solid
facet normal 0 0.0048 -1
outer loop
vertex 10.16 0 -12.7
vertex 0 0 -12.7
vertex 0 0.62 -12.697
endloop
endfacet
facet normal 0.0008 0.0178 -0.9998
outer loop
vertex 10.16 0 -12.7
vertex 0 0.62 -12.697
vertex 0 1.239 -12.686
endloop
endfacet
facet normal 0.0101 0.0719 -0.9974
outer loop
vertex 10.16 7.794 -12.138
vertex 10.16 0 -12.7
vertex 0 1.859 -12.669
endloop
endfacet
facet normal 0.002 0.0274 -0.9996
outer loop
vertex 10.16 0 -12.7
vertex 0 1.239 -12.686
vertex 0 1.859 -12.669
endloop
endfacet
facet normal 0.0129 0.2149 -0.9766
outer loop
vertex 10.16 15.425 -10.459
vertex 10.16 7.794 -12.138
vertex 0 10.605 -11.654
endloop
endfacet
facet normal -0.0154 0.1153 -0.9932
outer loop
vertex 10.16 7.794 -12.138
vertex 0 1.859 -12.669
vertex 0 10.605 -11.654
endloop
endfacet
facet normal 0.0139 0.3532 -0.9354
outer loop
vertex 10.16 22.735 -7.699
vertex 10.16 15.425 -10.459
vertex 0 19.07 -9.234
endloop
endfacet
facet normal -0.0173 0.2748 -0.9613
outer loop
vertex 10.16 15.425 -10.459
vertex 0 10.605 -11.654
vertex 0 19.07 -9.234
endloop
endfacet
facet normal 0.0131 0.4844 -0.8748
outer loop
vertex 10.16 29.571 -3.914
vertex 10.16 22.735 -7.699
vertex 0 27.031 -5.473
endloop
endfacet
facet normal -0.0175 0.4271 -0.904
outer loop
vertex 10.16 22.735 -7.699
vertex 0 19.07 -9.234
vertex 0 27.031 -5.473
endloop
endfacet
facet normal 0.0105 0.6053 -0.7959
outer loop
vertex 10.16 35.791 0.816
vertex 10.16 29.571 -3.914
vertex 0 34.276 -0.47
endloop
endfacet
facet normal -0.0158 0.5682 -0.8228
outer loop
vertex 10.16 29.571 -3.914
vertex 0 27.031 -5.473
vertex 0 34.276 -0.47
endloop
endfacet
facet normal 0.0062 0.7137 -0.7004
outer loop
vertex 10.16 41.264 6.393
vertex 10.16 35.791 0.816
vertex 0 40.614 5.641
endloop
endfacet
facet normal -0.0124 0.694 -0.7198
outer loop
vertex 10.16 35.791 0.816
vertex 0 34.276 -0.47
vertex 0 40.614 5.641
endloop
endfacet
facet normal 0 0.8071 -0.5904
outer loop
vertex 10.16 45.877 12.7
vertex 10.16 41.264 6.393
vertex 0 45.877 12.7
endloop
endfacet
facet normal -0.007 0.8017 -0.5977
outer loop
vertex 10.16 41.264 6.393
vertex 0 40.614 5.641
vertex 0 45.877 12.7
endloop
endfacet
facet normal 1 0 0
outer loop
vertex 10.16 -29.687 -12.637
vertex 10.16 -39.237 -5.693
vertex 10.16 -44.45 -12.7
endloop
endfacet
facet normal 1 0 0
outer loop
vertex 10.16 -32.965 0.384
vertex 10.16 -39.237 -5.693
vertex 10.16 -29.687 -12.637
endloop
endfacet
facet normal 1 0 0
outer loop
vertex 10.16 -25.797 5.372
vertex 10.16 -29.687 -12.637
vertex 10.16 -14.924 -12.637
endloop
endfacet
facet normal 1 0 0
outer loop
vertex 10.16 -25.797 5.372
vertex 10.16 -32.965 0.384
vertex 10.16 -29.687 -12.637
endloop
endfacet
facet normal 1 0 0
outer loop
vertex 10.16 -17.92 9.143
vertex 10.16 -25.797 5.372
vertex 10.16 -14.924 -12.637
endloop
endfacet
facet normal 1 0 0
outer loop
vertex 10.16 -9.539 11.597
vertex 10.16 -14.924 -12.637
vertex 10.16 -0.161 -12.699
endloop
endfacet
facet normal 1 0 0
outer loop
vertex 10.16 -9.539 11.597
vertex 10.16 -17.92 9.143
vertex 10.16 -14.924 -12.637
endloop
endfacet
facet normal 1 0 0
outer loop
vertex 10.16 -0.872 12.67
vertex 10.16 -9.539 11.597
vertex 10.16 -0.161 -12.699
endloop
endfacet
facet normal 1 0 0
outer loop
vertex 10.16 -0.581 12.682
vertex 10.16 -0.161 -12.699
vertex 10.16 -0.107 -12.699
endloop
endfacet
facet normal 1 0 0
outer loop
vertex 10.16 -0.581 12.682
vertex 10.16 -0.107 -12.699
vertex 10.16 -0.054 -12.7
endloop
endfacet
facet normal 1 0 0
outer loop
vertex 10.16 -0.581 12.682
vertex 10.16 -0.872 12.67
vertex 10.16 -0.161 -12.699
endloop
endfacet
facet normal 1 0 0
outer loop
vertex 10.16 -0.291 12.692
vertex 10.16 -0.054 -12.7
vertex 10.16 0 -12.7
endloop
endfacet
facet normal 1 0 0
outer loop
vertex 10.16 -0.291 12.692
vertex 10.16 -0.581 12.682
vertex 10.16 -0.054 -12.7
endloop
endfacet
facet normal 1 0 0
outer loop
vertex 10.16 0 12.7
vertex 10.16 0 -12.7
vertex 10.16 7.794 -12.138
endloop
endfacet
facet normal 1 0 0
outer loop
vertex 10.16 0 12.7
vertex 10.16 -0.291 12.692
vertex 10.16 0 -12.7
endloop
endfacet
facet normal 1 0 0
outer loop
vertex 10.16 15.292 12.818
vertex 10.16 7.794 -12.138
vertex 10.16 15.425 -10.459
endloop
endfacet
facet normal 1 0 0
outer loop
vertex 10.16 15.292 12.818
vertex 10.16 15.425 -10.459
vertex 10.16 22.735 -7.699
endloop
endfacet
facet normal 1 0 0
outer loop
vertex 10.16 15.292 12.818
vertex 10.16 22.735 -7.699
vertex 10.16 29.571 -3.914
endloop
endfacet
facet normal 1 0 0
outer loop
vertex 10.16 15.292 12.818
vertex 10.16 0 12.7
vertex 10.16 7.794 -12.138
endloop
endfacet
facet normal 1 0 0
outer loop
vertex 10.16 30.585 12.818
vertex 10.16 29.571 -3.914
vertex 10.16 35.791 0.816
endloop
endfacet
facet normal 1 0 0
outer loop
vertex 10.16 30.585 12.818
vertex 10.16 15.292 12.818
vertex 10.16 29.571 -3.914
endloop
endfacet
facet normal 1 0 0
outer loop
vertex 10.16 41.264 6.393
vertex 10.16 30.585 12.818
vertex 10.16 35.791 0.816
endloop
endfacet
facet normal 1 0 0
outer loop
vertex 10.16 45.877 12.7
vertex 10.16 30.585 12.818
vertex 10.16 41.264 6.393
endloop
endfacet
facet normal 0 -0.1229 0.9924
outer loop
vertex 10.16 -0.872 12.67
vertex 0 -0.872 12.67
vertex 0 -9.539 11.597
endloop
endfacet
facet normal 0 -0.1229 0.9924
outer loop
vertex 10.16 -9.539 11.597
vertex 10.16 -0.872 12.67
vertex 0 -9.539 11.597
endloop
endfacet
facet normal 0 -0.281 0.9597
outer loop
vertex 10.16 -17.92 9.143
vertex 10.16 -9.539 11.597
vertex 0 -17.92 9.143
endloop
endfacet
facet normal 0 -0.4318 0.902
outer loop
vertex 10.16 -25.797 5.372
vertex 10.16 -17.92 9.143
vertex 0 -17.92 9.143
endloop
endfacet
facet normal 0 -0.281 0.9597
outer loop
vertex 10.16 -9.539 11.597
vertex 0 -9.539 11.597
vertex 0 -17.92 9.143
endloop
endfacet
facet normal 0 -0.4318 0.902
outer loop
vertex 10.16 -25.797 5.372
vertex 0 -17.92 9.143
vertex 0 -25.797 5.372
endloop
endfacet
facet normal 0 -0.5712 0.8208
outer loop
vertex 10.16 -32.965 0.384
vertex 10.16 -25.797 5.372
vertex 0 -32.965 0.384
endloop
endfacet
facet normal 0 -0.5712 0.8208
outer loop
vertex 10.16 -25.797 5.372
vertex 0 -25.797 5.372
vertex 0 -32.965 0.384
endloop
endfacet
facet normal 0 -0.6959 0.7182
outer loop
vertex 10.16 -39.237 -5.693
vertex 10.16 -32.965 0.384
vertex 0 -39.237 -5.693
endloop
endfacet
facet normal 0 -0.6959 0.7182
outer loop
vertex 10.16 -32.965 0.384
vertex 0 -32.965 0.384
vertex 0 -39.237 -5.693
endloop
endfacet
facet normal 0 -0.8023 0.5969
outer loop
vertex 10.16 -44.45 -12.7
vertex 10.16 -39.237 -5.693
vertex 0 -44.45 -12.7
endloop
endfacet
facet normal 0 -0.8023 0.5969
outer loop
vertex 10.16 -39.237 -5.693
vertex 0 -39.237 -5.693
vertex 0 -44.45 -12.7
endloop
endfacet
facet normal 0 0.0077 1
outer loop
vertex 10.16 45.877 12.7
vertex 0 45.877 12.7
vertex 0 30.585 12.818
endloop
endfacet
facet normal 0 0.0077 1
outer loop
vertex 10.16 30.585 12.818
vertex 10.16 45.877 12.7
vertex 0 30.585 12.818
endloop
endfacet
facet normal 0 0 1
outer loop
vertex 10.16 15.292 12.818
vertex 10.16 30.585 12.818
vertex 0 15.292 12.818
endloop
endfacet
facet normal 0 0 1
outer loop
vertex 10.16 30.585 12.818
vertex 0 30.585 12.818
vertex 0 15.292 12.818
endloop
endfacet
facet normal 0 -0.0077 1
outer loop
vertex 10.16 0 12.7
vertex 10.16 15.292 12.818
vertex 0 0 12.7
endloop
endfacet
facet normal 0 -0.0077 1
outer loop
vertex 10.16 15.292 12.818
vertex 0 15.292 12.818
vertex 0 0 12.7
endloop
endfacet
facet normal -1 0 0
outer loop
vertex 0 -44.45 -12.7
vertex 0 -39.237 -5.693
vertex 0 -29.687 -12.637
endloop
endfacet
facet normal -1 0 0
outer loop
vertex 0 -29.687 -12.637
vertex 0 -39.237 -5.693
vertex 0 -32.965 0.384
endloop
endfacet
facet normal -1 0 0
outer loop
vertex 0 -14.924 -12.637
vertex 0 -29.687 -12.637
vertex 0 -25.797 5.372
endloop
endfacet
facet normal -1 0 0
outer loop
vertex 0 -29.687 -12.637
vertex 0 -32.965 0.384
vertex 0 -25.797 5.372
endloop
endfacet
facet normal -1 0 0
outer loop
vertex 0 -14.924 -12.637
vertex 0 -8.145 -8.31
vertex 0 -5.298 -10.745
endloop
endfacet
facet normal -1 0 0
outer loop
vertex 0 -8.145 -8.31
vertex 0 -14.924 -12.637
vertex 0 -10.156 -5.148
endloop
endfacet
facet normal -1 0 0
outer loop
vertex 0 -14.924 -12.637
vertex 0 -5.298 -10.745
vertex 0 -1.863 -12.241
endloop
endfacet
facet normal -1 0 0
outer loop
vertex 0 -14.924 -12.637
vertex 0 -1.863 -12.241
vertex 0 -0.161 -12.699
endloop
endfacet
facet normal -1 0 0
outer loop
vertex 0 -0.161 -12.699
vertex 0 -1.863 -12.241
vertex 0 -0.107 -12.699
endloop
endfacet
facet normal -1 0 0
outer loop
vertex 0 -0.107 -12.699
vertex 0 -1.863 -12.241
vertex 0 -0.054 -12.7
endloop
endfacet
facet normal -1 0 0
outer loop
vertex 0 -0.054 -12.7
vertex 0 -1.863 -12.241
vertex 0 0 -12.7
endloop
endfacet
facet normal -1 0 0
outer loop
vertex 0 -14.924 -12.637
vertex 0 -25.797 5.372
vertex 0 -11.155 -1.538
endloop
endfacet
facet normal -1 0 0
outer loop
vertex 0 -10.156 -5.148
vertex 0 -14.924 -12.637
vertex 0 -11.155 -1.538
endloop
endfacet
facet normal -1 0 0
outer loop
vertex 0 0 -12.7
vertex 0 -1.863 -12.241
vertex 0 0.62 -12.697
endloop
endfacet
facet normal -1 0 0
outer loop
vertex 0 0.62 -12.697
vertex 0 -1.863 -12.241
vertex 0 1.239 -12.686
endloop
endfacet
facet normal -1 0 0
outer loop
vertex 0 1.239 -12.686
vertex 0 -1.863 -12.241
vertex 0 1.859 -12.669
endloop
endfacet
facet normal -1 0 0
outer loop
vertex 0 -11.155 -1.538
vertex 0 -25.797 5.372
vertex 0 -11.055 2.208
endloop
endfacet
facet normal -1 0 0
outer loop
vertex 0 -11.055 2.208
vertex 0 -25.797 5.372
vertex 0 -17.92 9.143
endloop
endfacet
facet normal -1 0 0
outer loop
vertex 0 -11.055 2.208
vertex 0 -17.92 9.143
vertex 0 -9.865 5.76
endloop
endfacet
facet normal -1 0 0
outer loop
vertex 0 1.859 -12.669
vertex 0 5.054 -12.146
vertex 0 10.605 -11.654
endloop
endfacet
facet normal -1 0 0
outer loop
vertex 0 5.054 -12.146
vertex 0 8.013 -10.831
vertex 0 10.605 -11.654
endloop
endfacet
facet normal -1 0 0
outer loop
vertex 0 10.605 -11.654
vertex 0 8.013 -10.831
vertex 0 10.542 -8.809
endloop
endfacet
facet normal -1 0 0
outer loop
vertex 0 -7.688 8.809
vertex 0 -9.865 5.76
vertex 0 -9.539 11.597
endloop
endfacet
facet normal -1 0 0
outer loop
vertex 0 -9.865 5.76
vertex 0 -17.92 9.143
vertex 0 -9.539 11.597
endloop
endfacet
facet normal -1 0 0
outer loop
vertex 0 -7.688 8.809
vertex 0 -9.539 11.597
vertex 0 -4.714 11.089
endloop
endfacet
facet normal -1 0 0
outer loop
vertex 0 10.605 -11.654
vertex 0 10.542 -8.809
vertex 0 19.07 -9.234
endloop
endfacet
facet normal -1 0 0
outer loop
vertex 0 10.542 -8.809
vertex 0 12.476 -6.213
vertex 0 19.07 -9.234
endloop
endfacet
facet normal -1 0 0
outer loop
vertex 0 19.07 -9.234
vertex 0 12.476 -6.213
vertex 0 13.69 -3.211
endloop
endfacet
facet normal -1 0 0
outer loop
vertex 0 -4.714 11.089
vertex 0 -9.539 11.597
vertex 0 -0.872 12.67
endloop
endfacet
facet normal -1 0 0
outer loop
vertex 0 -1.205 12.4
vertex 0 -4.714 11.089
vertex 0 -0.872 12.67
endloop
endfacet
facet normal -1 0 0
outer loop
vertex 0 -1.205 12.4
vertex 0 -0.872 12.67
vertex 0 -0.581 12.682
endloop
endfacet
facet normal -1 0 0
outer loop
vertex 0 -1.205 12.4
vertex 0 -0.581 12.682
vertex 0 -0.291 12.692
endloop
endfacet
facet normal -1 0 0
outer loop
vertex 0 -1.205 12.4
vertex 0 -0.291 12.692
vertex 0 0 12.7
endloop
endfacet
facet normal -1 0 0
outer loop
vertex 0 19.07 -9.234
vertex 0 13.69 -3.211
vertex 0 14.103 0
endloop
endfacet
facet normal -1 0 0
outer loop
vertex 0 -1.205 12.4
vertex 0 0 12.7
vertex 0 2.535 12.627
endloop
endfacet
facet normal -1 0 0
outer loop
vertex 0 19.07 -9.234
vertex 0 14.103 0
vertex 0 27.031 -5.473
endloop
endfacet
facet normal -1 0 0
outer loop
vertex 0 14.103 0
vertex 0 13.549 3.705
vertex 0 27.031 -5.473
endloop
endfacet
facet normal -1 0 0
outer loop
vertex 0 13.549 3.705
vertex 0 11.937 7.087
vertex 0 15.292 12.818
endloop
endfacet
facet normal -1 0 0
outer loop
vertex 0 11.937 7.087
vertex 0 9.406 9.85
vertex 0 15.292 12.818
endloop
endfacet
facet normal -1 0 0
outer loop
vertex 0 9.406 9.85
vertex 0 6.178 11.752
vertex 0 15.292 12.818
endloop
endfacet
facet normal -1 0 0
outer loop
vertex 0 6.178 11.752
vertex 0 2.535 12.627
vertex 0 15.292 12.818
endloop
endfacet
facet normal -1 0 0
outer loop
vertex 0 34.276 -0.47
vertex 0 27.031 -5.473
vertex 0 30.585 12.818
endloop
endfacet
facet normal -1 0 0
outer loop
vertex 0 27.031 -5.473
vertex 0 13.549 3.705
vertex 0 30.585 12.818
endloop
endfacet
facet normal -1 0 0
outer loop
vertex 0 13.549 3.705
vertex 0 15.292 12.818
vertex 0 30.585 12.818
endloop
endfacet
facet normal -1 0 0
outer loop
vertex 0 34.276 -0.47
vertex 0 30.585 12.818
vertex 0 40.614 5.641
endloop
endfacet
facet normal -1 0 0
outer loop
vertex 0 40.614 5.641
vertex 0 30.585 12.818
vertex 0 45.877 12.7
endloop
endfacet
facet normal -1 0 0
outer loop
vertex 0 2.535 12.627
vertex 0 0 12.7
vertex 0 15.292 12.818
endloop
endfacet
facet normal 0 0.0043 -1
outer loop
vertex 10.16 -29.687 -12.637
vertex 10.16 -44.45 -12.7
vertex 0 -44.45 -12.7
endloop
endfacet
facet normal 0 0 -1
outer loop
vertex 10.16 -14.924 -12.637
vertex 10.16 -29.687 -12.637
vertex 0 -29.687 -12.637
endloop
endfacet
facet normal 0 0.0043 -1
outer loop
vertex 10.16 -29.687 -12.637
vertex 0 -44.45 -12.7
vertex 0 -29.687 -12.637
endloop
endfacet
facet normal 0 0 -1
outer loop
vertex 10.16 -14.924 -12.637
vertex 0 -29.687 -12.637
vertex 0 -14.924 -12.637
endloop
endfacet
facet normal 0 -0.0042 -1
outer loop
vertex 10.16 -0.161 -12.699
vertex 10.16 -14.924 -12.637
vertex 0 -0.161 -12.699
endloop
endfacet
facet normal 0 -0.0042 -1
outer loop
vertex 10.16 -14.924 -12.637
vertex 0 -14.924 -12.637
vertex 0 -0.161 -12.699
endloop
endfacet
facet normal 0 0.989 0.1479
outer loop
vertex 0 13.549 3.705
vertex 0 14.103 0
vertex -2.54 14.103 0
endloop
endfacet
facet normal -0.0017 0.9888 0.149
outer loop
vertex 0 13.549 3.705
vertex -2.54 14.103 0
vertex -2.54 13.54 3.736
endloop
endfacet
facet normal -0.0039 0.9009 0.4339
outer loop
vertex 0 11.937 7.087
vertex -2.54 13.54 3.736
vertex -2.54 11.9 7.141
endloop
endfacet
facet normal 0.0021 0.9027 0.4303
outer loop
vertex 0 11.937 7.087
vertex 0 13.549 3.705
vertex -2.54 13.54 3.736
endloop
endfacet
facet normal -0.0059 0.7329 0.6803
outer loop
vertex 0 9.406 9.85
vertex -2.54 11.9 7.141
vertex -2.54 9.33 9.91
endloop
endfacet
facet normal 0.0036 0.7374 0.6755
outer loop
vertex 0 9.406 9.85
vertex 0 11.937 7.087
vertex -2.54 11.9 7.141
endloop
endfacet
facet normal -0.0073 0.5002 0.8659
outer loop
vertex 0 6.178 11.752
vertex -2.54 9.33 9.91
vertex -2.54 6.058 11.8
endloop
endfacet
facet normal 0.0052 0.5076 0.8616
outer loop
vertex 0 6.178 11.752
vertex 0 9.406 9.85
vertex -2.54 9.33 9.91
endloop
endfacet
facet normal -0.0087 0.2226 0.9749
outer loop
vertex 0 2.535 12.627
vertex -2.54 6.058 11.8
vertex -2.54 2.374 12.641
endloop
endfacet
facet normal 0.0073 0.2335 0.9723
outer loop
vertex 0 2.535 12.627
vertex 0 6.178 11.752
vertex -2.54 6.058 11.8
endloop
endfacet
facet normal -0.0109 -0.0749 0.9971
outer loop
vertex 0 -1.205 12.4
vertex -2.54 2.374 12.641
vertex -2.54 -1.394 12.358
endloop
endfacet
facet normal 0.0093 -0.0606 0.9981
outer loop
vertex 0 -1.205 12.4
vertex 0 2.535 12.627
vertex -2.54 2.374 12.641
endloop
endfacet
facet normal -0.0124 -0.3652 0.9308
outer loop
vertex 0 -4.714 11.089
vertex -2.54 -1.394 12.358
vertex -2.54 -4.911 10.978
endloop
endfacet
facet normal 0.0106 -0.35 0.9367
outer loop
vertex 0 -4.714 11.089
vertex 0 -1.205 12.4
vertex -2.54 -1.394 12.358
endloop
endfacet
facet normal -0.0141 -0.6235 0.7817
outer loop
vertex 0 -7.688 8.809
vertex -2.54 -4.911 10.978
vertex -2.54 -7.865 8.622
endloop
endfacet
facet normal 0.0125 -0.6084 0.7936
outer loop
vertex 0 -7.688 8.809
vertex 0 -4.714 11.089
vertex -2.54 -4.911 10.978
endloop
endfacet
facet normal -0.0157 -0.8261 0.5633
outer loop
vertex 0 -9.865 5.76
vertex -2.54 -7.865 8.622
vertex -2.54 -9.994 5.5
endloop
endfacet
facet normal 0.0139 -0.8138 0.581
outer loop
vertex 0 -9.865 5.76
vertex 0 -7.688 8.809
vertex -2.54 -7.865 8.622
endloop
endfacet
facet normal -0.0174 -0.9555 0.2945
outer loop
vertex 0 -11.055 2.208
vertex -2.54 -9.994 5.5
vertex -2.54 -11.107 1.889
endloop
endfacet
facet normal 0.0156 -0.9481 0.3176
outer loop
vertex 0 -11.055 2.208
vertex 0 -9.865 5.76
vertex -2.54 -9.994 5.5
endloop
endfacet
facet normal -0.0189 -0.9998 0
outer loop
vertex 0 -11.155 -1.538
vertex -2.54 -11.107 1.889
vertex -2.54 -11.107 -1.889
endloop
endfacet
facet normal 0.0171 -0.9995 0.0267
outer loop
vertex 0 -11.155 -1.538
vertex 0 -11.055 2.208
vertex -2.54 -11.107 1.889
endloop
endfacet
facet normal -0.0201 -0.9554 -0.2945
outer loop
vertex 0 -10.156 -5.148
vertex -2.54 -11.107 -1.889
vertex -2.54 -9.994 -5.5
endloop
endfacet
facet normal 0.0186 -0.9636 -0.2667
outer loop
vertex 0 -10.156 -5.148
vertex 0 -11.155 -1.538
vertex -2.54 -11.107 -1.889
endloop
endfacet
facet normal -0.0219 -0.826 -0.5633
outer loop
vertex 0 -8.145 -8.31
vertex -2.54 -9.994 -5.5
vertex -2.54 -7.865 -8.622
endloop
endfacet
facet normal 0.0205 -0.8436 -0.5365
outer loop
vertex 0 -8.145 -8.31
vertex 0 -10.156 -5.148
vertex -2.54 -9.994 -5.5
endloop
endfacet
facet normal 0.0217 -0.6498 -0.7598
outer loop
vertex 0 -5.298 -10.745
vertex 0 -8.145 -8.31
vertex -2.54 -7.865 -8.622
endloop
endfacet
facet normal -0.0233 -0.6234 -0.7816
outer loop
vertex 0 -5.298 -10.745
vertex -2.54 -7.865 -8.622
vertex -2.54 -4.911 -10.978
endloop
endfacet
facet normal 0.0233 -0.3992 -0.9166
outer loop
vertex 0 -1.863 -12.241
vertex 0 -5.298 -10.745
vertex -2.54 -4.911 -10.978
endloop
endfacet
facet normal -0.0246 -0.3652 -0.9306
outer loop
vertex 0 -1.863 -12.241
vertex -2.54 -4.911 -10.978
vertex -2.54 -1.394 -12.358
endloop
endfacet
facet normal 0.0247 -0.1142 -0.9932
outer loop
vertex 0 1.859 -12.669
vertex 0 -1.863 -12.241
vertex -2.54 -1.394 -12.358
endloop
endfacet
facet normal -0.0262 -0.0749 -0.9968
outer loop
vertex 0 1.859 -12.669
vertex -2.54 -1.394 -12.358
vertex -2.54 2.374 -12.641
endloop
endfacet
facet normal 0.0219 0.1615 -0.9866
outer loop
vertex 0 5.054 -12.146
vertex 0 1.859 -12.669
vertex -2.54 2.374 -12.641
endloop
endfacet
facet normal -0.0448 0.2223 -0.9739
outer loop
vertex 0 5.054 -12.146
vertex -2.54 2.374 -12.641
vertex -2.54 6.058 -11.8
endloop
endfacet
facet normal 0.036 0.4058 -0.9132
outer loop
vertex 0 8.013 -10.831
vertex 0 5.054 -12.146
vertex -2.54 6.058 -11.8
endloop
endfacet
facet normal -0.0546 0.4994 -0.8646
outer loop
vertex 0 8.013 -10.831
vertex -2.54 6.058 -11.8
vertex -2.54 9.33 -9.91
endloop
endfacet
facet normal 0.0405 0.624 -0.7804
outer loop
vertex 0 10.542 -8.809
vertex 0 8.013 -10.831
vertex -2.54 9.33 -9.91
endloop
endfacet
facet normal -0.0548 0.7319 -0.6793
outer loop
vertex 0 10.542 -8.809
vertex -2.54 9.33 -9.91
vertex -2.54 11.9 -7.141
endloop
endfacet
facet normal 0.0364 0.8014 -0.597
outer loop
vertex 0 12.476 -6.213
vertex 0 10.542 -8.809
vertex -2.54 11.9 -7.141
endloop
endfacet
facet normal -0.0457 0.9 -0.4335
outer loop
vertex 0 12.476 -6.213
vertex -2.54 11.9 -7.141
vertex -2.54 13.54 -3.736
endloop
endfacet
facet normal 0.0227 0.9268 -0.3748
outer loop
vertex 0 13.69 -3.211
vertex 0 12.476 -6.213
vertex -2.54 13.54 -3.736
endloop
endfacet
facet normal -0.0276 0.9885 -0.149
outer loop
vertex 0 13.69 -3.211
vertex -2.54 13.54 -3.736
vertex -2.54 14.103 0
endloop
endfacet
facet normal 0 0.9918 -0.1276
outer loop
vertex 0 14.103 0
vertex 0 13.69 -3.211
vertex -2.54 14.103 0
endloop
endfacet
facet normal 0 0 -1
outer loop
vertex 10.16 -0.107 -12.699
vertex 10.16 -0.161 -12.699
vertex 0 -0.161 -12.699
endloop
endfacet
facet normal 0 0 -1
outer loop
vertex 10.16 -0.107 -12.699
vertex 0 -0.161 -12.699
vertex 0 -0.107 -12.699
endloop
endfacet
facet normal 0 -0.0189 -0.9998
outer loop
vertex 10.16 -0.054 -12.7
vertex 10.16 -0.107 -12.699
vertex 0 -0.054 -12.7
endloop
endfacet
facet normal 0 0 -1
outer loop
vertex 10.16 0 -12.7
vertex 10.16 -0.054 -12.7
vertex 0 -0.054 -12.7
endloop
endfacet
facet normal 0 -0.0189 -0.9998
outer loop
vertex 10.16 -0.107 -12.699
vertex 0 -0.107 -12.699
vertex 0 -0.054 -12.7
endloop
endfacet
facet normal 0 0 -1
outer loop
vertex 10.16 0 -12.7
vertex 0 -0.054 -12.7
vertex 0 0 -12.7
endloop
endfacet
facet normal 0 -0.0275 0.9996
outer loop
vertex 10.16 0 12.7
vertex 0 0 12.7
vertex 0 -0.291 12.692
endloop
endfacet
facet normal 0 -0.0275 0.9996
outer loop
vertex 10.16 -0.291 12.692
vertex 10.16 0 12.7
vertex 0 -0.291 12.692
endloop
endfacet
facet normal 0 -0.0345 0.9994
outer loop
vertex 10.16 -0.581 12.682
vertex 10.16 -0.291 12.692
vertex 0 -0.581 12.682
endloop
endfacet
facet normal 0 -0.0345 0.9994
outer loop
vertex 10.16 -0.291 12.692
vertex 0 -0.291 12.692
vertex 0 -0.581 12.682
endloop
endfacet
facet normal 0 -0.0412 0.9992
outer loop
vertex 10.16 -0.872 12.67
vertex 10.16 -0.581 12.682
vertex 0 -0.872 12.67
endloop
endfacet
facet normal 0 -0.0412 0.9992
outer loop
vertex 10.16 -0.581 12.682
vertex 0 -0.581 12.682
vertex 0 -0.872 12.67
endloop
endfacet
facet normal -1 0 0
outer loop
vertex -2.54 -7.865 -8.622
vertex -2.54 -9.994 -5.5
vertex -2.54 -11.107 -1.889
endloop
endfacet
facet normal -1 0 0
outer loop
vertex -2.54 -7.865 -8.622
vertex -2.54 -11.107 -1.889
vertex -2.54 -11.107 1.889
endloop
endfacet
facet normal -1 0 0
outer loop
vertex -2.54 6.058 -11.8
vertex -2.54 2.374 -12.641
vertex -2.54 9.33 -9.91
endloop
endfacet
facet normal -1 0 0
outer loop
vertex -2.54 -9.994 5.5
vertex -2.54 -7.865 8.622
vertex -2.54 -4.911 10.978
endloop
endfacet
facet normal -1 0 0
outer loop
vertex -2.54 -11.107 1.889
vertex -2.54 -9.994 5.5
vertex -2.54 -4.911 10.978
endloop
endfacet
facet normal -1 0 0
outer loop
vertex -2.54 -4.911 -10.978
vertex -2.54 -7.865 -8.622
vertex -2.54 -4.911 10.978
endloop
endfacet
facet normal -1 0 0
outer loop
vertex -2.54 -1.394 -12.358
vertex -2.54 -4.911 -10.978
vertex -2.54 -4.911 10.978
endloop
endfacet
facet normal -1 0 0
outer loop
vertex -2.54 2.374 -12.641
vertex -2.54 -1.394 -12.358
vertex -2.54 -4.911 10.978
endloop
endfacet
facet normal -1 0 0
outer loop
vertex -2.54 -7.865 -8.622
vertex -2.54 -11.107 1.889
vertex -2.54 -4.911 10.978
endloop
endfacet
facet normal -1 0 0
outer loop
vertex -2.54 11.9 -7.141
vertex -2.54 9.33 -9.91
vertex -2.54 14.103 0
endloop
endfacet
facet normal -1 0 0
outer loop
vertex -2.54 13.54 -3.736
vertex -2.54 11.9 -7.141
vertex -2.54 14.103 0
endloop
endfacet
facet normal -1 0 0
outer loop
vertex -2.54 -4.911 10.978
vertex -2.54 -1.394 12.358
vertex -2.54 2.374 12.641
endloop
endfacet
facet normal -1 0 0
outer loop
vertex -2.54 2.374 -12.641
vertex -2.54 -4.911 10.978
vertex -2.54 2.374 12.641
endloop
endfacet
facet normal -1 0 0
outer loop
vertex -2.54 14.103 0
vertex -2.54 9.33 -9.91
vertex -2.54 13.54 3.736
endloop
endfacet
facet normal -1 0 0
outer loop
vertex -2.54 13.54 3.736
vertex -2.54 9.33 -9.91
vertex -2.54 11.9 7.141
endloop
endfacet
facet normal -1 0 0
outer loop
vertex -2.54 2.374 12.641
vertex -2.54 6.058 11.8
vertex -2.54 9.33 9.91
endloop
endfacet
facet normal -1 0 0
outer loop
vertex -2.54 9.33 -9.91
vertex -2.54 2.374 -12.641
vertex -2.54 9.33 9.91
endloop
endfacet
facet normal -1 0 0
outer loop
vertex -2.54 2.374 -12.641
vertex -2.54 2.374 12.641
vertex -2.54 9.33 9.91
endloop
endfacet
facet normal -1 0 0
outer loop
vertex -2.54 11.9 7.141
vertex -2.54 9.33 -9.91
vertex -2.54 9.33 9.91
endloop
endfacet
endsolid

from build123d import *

# Parameters (mm, degrees)
F1_DEPTH = 10.16
F2_R     = 12.675969
F3_DEPTH = 12.7


with BuildPart() as f1:
    # F0 (on Right) → F1 (new body)
    with BuildSketch(Plane.YZ):
        with BuildLine():
            ThreePointArc((0, -12.7), (8.980256, -8.980256), (12.7, 0))
            ThreePointArc((12.7, 0), (8.980256, 8.980256), (0, 12.7))
            ThreePointArc((0, 12.7), (-0.436122, 12.686768), (-0.872122, 12.67002))
            ThreePointArc((-0.872122, 12.67002), (-12.695008, -0.356034), (-0.160643, -12.698984))
            ThreePointArc((-0.160643, -12.698984), (-0.080321, -12.699491), (0, -12.7))
        make_face()
        with BuildLine():
            ThreePointArc((0, 12.7), (8.980256, 8.980256), (12.7, 0))
            ThreePointArc((12.7, 0), (8.980256, -8.980256), (0, -12.7))
            ThreePointArc((0, -12.7), (26.221595, -5.929824), (45.877051, 12.7))
            ThreePointArc((45.877051, 12.7), (22.938525, 12.832797), (0, 12.7))
        make_face()
        with BuildLine():
            ThreePointArc((-0.160643, -12.698984), (-12.695008, -0.356034), (-0.872122, 12.67002))
            ThreePointArc((-0.872122, 12.67002), (-25.79747, 5.372395), (-44.45, -12.7))
            ThreePointArc((-44.45, -12.7), (-22.305323, -12.629463), (-0.160643, -12.698984))
        make_face()
    extrude(amount=F1_DEPTH)

    # F2 (on face) → F3 (join)
    with BuildSketch(Plane.YZ.offset(10.16)):
        with Locations((1.427051, 0)):
            Circle(F2_R)
    extrude(amount=-F3_DEPTH)


solid = f1.part
